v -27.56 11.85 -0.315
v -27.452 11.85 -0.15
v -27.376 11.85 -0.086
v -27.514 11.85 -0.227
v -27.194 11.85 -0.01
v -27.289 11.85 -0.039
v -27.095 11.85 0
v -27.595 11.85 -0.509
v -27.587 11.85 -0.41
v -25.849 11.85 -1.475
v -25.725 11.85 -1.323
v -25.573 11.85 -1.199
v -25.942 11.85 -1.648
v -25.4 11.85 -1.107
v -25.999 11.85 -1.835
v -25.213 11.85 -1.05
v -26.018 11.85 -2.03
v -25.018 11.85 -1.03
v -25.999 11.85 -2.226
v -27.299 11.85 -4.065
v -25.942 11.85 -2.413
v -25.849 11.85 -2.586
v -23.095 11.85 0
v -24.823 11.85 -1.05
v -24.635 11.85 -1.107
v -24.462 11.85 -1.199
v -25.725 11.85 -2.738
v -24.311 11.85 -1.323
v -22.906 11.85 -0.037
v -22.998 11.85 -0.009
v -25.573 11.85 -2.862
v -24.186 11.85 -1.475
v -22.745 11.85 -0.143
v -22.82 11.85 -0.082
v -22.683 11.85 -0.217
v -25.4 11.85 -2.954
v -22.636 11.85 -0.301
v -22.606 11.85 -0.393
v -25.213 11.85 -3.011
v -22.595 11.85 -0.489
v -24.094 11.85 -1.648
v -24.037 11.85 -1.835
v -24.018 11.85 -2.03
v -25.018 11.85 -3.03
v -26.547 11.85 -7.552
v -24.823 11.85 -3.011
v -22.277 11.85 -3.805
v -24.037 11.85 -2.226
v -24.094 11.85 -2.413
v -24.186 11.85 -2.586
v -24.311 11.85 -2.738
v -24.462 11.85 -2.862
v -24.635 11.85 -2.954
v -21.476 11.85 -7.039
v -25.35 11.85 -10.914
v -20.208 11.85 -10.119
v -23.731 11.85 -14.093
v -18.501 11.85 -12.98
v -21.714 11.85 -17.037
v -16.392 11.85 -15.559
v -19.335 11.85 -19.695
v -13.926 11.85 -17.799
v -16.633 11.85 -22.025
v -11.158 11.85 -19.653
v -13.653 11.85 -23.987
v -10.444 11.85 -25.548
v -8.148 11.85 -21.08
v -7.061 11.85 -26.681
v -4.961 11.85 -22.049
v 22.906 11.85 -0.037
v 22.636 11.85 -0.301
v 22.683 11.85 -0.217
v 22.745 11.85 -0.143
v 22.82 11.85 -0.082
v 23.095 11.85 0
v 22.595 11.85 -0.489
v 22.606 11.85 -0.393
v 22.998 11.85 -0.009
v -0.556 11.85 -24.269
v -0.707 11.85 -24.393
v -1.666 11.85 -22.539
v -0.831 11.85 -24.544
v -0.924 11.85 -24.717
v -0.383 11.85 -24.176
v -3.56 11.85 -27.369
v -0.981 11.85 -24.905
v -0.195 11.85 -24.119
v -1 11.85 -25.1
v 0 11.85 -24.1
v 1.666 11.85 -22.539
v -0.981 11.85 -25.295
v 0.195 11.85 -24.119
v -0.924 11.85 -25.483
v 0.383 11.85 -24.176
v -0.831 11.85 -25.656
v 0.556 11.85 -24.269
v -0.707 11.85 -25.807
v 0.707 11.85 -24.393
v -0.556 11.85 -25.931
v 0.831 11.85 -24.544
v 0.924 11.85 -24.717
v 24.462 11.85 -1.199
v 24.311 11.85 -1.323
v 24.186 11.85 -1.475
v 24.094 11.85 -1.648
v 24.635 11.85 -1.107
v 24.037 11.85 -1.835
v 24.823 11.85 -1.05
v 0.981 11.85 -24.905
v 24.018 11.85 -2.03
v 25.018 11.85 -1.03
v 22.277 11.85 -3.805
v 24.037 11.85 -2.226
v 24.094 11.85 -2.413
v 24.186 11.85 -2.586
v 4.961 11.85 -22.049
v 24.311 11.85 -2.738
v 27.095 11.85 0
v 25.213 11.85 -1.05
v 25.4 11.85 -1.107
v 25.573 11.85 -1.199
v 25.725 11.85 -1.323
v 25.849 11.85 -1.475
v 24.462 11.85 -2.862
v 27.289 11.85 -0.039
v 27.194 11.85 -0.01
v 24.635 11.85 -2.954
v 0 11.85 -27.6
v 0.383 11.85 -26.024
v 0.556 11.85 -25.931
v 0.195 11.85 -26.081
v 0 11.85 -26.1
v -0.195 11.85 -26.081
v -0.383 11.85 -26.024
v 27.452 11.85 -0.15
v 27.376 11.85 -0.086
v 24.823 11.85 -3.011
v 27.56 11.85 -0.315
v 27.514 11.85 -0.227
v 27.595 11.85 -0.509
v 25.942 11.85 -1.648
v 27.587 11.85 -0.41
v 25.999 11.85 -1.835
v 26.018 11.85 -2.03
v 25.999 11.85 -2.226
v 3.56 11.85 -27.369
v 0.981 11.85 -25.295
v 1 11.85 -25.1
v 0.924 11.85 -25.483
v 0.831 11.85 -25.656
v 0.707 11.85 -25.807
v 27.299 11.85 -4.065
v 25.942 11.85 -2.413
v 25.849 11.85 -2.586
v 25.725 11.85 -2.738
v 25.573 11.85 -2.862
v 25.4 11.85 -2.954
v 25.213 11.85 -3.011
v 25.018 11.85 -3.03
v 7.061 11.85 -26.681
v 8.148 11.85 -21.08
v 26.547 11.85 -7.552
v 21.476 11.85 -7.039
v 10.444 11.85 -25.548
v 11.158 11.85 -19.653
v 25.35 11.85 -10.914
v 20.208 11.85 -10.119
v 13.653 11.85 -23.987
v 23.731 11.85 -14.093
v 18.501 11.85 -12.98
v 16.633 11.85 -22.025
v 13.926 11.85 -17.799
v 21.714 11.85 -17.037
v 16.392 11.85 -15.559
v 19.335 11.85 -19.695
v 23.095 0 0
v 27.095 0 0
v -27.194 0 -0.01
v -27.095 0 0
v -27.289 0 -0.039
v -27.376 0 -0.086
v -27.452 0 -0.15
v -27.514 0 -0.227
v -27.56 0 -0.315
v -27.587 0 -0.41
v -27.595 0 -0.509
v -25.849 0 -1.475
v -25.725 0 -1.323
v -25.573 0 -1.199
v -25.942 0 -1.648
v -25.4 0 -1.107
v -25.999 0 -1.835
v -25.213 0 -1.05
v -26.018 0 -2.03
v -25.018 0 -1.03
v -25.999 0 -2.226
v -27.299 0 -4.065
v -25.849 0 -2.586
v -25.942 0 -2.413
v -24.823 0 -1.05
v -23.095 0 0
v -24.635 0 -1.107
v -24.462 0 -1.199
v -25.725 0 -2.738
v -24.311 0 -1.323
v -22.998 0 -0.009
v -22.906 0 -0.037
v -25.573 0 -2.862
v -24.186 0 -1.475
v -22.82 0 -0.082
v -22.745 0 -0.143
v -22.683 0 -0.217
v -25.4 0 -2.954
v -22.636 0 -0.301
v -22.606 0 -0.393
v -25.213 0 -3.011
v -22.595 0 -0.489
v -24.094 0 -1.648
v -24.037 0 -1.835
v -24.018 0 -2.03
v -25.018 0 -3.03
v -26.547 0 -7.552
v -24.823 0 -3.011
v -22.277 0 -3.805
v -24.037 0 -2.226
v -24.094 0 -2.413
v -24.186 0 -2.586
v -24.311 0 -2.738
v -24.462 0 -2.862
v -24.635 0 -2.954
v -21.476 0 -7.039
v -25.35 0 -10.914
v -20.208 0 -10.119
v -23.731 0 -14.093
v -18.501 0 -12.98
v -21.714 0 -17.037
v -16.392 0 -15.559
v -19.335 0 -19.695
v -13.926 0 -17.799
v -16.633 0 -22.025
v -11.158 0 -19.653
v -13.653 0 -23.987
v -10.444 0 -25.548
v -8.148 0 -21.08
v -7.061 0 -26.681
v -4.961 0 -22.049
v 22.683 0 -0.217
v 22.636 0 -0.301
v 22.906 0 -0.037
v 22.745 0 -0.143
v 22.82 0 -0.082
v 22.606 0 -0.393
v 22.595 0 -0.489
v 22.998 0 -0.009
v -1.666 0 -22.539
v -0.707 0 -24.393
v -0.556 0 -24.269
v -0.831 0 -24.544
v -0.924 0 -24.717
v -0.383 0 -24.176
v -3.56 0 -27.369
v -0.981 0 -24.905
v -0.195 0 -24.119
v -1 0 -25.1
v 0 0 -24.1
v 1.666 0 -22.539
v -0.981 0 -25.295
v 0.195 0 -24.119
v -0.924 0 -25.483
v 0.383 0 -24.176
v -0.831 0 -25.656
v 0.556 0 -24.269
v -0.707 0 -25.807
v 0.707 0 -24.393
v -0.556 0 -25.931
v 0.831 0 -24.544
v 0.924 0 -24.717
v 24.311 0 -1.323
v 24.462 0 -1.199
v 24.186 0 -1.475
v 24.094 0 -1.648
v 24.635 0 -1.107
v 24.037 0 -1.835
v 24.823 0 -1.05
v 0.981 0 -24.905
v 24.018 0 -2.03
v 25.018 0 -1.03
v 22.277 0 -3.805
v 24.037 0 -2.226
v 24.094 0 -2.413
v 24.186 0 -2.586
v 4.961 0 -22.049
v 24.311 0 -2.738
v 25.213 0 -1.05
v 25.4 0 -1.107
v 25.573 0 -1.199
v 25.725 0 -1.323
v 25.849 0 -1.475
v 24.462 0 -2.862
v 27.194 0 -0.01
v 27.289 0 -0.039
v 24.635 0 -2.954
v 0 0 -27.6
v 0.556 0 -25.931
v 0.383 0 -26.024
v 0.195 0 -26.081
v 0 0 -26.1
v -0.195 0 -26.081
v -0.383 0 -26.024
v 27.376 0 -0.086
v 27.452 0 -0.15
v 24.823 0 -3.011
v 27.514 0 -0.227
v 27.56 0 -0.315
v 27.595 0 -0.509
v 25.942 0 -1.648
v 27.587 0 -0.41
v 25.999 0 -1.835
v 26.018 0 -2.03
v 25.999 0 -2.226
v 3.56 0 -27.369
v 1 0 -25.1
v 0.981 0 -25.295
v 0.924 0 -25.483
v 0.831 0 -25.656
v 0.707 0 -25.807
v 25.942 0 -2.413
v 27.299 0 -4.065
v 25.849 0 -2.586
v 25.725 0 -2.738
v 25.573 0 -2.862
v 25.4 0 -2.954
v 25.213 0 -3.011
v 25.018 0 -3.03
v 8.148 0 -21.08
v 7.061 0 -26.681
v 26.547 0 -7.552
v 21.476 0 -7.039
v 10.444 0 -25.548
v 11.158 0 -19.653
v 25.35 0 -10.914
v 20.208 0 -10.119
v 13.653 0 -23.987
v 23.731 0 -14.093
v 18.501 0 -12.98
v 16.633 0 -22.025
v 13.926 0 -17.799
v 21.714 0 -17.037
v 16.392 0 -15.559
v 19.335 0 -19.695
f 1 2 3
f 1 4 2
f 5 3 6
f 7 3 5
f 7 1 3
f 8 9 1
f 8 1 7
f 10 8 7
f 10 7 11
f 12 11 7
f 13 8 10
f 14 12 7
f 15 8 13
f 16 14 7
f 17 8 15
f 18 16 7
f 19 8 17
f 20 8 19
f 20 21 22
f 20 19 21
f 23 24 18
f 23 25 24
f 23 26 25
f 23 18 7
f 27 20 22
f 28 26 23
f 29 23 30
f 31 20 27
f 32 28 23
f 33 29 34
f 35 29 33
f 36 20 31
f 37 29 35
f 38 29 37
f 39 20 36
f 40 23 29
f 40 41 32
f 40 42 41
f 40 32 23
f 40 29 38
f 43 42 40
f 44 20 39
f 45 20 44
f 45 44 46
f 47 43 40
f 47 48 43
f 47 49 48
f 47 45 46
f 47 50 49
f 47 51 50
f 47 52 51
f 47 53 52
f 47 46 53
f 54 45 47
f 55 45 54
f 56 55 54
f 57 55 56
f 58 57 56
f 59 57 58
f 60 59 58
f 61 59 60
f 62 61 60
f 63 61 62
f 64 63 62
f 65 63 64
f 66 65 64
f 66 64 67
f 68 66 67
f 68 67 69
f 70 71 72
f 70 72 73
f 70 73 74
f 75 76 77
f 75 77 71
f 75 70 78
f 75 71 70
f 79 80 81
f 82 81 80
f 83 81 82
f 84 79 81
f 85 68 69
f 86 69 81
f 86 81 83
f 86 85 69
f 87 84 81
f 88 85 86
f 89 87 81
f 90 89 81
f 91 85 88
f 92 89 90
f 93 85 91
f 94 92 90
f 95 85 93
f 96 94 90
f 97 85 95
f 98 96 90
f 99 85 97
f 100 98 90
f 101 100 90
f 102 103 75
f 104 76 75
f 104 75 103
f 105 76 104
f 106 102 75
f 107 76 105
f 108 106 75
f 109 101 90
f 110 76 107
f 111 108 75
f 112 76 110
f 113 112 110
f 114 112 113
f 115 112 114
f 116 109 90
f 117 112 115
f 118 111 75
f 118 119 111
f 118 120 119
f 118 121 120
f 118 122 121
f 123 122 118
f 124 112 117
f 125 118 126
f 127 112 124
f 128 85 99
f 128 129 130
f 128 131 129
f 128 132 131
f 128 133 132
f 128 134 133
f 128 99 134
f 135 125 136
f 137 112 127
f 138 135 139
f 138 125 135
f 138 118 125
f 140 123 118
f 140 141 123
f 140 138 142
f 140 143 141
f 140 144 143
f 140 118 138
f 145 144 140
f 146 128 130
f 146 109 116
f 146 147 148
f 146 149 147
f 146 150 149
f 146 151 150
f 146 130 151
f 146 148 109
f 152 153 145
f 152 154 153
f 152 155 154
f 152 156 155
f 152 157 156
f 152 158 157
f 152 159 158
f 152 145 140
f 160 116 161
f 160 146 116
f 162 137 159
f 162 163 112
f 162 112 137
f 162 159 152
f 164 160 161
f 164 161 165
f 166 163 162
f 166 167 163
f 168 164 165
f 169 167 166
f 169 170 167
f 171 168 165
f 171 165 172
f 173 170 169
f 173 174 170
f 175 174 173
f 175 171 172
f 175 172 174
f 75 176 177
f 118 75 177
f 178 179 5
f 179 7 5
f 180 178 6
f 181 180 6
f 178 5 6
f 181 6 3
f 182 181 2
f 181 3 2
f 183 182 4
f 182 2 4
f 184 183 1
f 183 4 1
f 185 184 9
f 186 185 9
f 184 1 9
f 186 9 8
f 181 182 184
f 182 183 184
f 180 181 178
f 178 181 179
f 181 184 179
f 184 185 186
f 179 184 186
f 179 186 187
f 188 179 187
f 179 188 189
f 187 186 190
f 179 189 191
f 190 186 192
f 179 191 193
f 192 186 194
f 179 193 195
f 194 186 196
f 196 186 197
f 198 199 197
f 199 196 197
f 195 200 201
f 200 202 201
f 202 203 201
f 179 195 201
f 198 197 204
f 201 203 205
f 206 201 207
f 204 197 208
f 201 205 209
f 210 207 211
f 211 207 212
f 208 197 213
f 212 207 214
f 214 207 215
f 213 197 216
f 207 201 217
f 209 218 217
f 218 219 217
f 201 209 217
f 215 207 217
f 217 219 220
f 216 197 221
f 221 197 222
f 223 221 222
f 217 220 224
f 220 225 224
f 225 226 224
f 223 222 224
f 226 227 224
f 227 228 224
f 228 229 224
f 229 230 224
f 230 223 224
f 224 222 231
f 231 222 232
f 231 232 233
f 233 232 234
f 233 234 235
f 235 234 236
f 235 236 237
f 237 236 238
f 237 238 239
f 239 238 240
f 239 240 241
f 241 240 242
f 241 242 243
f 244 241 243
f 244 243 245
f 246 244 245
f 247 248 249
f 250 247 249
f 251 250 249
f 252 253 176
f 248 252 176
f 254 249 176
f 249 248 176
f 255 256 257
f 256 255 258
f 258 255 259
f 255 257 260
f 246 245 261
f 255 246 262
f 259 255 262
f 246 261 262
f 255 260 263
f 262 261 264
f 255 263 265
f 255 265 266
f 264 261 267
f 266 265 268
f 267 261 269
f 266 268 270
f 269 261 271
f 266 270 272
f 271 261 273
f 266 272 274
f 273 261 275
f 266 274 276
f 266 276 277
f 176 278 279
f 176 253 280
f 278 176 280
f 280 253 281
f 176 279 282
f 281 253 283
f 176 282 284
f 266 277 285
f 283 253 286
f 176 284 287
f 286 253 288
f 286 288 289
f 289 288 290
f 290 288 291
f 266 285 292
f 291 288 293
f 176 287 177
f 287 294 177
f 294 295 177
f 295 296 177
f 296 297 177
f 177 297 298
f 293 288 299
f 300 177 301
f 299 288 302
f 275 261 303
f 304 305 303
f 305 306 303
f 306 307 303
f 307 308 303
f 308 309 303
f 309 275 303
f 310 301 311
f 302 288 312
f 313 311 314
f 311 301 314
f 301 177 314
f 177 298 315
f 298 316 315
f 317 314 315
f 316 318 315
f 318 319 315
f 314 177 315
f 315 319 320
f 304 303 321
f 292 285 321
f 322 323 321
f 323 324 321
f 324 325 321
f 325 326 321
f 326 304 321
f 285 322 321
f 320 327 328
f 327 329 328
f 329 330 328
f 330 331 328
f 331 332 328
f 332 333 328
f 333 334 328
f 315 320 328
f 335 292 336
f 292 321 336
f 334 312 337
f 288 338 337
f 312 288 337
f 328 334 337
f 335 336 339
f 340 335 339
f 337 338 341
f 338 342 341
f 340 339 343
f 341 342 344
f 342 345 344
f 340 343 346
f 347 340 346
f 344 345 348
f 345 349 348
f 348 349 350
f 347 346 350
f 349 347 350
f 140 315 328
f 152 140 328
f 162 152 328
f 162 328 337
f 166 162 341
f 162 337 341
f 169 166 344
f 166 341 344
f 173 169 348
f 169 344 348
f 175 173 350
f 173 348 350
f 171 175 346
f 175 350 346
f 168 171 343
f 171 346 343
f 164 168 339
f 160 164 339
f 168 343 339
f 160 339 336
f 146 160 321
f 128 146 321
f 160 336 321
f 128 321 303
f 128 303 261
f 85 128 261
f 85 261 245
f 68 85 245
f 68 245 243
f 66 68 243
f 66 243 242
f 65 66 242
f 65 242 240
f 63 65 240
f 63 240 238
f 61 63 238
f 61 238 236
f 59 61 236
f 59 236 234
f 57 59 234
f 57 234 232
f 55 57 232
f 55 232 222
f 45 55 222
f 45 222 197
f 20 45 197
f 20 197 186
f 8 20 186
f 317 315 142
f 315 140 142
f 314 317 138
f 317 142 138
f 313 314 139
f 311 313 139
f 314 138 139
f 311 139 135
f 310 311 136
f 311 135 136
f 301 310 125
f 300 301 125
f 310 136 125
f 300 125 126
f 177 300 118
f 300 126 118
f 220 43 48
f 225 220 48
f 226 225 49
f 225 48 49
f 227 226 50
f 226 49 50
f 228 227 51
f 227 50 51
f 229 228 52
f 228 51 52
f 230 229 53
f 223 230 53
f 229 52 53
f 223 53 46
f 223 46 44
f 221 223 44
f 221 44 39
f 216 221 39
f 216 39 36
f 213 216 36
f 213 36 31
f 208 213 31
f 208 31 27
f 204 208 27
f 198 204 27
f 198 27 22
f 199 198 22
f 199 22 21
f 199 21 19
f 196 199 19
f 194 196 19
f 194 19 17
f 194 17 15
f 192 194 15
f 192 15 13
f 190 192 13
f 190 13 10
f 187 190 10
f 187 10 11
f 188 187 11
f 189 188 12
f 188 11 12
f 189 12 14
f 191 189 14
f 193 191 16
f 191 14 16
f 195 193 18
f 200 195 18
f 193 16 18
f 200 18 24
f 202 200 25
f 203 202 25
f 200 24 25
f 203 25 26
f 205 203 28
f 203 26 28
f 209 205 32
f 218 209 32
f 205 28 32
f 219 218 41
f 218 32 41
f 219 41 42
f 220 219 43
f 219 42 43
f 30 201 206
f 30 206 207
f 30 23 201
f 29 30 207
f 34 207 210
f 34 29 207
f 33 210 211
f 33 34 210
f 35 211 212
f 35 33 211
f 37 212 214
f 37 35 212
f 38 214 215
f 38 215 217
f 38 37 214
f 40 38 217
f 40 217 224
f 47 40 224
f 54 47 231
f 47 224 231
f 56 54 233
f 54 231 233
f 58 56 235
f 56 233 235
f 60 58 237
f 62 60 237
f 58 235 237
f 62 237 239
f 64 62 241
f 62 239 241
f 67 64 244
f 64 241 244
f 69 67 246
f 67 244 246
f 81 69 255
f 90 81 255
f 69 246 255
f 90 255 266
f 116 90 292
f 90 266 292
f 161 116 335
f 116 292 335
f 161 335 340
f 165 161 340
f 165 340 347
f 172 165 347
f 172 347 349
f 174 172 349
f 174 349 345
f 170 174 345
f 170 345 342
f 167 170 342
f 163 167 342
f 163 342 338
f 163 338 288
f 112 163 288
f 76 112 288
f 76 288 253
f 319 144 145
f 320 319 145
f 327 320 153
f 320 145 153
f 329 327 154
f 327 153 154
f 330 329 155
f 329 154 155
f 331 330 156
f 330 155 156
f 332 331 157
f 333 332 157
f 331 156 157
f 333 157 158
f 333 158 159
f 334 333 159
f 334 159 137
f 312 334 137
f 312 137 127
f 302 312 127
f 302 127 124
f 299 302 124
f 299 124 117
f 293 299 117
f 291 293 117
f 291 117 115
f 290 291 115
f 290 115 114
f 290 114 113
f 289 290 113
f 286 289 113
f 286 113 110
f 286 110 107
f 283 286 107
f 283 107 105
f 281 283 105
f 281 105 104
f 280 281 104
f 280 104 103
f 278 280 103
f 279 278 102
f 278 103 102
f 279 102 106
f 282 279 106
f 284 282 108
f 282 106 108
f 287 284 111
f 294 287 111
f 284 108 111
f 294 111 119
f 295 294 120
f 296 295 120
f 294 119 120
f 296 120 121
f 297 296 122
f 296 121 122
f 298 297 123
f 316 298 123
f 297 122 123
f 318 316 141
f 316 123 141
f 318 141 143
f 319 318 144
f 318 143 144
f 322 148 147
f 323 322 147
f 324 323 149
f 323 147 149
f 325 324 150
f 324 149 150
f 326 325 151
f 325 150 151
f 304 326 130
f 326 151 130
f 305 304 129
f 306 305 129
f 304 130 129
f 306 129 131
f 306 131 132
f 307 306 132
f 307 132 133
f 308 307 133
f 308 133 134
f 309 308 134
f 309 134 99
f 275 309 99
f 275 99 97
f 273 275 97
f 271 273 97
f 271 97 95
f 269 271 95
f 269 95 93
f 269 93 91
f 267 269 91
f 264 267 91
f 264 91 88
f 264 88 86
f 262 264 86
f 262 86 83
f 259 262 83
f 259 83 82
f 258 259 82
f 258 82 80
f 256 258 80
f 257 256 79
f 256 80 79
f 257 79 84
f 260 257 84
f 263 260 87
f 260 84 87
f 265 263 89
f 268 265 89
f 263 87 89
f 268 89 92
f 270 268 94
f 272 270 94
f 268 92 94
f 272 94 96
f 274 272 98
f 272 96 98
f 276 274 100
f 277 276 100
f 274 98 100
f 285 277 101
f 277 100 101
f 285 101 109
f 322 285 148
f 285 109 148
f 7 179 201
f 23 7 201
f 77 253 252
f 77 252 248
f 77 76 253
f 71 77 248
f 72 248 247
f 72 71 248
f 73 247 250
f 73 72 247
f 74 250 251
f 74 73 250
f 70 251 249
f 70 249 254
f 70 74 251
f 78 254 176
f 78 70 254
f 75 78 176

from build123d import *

# Parameters (mm, degrees)
EXTRUDE_1_DEPTH     = 11.85
SKETCH_2_R          = 1
CUT_EXTRUDE_1_DEPTH = 12.85
FILLET_1_R          = 0.5


with BuildPart() as part:
    # 草图1 → 凸台-拉伸1 (new body)
    with BuildSketch(Plane(origin=(0, 0, 0), x_dir=(1, 0, 0), z_dir=(0, 1, 0))):
        with BuildLine():
            Line((-27.6, 0), (-22.6, 0))
            ThreePointArc((-22.6, 0), (0, 22.6), (22.6, 0))
            Line((22.6, 0), (27.6, 0))
            ThreePointArc((27.6, 0), (0, 27.6), (-27.6, 0))
        make_face()
    extrude(amount=EXTRUDE_1_DEPTH)

    # 草图2 → 切除-拉伸1 (cut, through all)
    with BuildSketch(Plane(origin=(0, 11.85, 0), x_dir=(1, 0, 0), z_dir=(0, 1, 0))):
        with Locations((-25.017738418, 2.03045917)):
            Circle(SKETCH_2_R)
        with Locations((25.017738418, 2.03045917)):
            Circle(SKETCH_2_R)
        with Locations((0, 25.1)):
            Circle(SKETCH_2_R)
    extrude(amount=-CUT_EXTRUDE_1_DEPTH, mode=Mode.SUBTRACT)

    # 圆角1
    fillet_1_edges = [part.edges().sort_by_distance(p)[0] for p in [
        (-22.6, 5.925, 0),
        (-27.6, 5.925, 0),
        (27.6, 5.925, 0),
        (22.6, 5.925, 0),
    ]]
    fillet(fillet_1_edges, radius=FILLET_1_R)


solid = part.part
